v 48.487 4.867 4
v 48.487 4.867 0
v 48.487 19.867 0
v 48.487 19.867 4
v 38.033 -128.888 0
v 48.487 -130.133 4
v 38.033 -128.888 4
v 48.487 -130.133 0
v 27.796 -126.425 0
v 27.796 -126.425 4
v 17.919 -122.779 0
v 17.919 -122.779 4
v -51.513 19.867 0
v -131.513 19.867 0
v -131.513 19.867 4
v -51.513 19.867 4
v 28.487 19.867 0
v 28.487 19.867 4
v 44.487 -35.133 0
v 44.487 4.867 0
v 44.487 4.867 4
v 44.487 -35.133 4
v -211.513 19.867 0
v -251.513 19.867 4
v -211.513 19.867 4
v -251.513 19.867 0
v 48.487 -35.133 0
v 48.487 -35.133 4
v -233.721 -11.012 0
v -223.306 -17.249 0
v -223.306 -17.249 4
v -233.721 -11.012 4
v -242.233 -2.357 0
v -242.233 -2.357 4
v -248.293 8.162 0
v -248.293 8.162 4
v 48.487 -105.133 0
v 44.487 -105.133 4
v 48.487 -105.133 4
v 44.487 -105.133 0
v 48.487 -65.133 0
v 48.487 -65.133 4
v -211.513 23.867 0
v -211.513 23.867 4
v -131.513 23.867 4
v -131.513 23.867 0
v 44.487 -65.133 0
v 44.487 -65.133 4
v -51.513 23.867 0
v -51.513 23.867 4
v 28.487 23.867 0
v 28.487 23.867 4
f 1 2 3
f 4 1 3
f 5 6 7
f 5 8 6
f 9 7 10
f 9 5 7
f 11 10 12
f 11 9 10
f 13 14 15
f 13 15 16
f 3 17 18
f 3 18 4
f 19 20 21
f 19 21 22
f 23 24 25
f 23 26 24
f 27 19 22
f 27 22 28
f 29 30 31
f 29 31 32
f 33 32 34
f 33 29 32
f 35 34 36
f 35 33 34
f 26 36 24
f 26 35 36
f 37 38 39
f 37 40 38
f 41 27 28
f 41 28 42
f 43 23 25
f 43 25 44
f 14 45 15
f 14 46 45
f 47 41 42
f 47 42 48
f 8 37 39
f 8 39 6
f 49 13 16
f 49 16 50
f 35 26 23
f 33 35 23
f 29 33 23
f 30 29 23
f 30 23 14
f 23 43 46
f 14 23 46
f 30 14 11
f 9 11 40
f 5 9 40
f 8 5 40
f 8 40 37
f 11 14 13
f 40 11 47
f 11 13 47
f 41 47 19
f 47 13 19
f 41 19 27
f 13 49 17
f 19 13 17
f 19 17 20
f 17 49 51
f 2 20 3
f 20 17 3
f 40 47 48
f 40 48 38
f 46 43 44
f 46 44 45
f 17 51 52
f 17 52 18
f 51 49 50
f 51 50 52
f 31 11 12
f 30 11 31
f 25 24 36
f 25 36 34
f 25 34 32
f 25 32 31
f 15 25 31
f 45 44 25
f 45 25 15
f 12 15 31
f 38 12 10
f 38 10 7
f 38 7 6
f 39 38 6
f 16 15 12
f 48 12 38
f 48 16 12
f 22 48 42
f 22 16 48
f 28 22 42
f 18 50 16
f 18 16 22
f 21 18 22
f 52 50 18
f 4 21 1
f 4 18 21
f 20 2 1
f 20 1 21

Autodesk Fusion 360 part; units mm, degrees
sketch "Sketch1" plane through (0, 0, 0) normal (0, 0, 1) x (1, 0, 0)
  line L0 (-73.0553, -57.6886) -> (226.9447, -57.6886)
  line L1 (226.9447, 242.3114) -> (-73.0553, 242.3114)
  line L2 (-73.0553, 222.3114) -> (-69.0553, 222.3114)
  line L3 (-69.0553, 222.3114) -> (-69.0553, 142.3114)
  line L4 (-69.0553, 142.3114) -> (-73.0553, 142.3114)
  line L5 (-73.0553, 242.3114) -> (-73.0553, 222.3114)
  line L6 (-73.0553, -17.6886) -> (-69.0553, -17.6886)
  line L7 (-69.0553, -17.6886) -> (-69.0553, 62.3114)
  line L8 (-69.0553, 62.3114) -> (-73.0553, 62.3114)
  line L9 (-73.0553, 142.3114) -> (-73.0553, 62.3114)
  line L10 (-73.0553, -17.6886) -> (-73.0553, -57.6886)
  line L11 (226.9447, 222.3114) -> (222.9447, 222.3114)
  line L12 (222.9447, 222.3114) -> (222.9447, 142.3114)
  line L13 (222.9447, 142.3114) -> (226.9447, 142.3114)
  line L14 (226.9447, 62.3114) -> (222.9447, 62.3114)
  line L15 (222.9447, 62.3114) -> (222.9447, -17.6886)
  line L16 (222.9447, -17.6886) -> (226.9447, -17.6886)
  line L17 (226.9447, -17.6886) -> (226.9447, -57.6886)
  line L18 (226.9447, 142.3114) -> (226.9447, 62.3114)
  line L19 (226.9447, 242.3114) -> (226.9447, 222.3114)
  dimension "d1" = 300
  dimension "d2" = 300
  dimension "d3" = 20
  dimension "d4" = 4
  dimension "d5" = 80
  dimension "d6" = 80
  dimension "d7" = 80
  dimension "d8" = 4
  dimension "d9" = 4
  dimension "d10" = 80
  dimension "d11" = 20
  dimension "d12" = 80
  dimension "d13" = 80
extrude "Extrude1" add sketch "Sketch1" along normal blind 4

Autodesk Fusion 360 part; units mm, degrees
sketch "Sketch1" plane through (0, 0, 0) normal (0, 0, 1) x (1, 0, 0)
  line L0 (-51.5127, 19.8666) -> (-51.5127, 23.8666)
  line L1 (-51.5127, 23.8666) -> (28.4873, 23.8666)
  line L2 (28.4873, 23.8666) -> (28.4873, 19.8666)
  line L3 (-211.5127, 19.8666) -> (-211.5127, 23.8666)
  line L4 (-211.5127, 23.8666) -> (-131.5127, 23.8666)
  line L5 (-131.5127, 23.8666) -> (-131.5127, 19.8666)
  line L6 (48.4873, 4.8666) -> (44.4873, 4.8666)
  line L7 (44.4873, 4.8666) -> (44.4873, -35.1334)
  line L8 (44.4873, -35.1334) -> (48.4873, -35.1334)
  line L9 (48.4873, -65.1334) -> (44.4873, -65.1334)
  line L10 (44.4873, -65.1334) -> (44.4873, -105.1334)
  line L11 (44.4873, -105.1334) -> (48.4873, -105.1334)
  line L12 (-251.5127, 19.8666) -> (-211.5127, 19.8666)
  line L13 (-131.5127, 19.8666) -> (-51.5127, 19.8666)
  line L14 (28.4873, 19.8666) -> (48.4873, 19.8666)
  line L15 (48.4873, 4.8666) -> (48.4873, 6.5368)
  line L16 (48.4873, 6.5368) -> (48.4873, 19.8666)
  line L17 (48.4873, -35.1334) -> (48.4873, -65.1334)
  line L18 (48.4873, -105.1334) -> (48.4873, -130.1334)
  line L19 (17.9193, -122.7788) -> (-223.306, -17.2487)
  arc A0 (-251.5127, 19.8666) -> (-223.306, -17.2487) centre (-204.1197, 26.6083) ccw
  arc A1 (17.9193, -122.7788) -> (48.4873, -130.1334) centre (53.8475, -40.6527) ccw
  dimension "d1" = 300
  dimension "d2" = 150
  dimension "d3" = 4
  dimension "d4" = 4
  dimension "d5" = 80
  dimension "d6" = 80
  dimension "d7" = 20
  dimension "d8" = 80
  dimension "d9" = 4
  dimension "d10" = 4
  dimension "d11" = 40
  dimension "d12" = 40
  dimension "d13" = 30
  dimension "d14" = 15
extrude "Extrude1" add sketch "Sketch1" along normal blind 4
